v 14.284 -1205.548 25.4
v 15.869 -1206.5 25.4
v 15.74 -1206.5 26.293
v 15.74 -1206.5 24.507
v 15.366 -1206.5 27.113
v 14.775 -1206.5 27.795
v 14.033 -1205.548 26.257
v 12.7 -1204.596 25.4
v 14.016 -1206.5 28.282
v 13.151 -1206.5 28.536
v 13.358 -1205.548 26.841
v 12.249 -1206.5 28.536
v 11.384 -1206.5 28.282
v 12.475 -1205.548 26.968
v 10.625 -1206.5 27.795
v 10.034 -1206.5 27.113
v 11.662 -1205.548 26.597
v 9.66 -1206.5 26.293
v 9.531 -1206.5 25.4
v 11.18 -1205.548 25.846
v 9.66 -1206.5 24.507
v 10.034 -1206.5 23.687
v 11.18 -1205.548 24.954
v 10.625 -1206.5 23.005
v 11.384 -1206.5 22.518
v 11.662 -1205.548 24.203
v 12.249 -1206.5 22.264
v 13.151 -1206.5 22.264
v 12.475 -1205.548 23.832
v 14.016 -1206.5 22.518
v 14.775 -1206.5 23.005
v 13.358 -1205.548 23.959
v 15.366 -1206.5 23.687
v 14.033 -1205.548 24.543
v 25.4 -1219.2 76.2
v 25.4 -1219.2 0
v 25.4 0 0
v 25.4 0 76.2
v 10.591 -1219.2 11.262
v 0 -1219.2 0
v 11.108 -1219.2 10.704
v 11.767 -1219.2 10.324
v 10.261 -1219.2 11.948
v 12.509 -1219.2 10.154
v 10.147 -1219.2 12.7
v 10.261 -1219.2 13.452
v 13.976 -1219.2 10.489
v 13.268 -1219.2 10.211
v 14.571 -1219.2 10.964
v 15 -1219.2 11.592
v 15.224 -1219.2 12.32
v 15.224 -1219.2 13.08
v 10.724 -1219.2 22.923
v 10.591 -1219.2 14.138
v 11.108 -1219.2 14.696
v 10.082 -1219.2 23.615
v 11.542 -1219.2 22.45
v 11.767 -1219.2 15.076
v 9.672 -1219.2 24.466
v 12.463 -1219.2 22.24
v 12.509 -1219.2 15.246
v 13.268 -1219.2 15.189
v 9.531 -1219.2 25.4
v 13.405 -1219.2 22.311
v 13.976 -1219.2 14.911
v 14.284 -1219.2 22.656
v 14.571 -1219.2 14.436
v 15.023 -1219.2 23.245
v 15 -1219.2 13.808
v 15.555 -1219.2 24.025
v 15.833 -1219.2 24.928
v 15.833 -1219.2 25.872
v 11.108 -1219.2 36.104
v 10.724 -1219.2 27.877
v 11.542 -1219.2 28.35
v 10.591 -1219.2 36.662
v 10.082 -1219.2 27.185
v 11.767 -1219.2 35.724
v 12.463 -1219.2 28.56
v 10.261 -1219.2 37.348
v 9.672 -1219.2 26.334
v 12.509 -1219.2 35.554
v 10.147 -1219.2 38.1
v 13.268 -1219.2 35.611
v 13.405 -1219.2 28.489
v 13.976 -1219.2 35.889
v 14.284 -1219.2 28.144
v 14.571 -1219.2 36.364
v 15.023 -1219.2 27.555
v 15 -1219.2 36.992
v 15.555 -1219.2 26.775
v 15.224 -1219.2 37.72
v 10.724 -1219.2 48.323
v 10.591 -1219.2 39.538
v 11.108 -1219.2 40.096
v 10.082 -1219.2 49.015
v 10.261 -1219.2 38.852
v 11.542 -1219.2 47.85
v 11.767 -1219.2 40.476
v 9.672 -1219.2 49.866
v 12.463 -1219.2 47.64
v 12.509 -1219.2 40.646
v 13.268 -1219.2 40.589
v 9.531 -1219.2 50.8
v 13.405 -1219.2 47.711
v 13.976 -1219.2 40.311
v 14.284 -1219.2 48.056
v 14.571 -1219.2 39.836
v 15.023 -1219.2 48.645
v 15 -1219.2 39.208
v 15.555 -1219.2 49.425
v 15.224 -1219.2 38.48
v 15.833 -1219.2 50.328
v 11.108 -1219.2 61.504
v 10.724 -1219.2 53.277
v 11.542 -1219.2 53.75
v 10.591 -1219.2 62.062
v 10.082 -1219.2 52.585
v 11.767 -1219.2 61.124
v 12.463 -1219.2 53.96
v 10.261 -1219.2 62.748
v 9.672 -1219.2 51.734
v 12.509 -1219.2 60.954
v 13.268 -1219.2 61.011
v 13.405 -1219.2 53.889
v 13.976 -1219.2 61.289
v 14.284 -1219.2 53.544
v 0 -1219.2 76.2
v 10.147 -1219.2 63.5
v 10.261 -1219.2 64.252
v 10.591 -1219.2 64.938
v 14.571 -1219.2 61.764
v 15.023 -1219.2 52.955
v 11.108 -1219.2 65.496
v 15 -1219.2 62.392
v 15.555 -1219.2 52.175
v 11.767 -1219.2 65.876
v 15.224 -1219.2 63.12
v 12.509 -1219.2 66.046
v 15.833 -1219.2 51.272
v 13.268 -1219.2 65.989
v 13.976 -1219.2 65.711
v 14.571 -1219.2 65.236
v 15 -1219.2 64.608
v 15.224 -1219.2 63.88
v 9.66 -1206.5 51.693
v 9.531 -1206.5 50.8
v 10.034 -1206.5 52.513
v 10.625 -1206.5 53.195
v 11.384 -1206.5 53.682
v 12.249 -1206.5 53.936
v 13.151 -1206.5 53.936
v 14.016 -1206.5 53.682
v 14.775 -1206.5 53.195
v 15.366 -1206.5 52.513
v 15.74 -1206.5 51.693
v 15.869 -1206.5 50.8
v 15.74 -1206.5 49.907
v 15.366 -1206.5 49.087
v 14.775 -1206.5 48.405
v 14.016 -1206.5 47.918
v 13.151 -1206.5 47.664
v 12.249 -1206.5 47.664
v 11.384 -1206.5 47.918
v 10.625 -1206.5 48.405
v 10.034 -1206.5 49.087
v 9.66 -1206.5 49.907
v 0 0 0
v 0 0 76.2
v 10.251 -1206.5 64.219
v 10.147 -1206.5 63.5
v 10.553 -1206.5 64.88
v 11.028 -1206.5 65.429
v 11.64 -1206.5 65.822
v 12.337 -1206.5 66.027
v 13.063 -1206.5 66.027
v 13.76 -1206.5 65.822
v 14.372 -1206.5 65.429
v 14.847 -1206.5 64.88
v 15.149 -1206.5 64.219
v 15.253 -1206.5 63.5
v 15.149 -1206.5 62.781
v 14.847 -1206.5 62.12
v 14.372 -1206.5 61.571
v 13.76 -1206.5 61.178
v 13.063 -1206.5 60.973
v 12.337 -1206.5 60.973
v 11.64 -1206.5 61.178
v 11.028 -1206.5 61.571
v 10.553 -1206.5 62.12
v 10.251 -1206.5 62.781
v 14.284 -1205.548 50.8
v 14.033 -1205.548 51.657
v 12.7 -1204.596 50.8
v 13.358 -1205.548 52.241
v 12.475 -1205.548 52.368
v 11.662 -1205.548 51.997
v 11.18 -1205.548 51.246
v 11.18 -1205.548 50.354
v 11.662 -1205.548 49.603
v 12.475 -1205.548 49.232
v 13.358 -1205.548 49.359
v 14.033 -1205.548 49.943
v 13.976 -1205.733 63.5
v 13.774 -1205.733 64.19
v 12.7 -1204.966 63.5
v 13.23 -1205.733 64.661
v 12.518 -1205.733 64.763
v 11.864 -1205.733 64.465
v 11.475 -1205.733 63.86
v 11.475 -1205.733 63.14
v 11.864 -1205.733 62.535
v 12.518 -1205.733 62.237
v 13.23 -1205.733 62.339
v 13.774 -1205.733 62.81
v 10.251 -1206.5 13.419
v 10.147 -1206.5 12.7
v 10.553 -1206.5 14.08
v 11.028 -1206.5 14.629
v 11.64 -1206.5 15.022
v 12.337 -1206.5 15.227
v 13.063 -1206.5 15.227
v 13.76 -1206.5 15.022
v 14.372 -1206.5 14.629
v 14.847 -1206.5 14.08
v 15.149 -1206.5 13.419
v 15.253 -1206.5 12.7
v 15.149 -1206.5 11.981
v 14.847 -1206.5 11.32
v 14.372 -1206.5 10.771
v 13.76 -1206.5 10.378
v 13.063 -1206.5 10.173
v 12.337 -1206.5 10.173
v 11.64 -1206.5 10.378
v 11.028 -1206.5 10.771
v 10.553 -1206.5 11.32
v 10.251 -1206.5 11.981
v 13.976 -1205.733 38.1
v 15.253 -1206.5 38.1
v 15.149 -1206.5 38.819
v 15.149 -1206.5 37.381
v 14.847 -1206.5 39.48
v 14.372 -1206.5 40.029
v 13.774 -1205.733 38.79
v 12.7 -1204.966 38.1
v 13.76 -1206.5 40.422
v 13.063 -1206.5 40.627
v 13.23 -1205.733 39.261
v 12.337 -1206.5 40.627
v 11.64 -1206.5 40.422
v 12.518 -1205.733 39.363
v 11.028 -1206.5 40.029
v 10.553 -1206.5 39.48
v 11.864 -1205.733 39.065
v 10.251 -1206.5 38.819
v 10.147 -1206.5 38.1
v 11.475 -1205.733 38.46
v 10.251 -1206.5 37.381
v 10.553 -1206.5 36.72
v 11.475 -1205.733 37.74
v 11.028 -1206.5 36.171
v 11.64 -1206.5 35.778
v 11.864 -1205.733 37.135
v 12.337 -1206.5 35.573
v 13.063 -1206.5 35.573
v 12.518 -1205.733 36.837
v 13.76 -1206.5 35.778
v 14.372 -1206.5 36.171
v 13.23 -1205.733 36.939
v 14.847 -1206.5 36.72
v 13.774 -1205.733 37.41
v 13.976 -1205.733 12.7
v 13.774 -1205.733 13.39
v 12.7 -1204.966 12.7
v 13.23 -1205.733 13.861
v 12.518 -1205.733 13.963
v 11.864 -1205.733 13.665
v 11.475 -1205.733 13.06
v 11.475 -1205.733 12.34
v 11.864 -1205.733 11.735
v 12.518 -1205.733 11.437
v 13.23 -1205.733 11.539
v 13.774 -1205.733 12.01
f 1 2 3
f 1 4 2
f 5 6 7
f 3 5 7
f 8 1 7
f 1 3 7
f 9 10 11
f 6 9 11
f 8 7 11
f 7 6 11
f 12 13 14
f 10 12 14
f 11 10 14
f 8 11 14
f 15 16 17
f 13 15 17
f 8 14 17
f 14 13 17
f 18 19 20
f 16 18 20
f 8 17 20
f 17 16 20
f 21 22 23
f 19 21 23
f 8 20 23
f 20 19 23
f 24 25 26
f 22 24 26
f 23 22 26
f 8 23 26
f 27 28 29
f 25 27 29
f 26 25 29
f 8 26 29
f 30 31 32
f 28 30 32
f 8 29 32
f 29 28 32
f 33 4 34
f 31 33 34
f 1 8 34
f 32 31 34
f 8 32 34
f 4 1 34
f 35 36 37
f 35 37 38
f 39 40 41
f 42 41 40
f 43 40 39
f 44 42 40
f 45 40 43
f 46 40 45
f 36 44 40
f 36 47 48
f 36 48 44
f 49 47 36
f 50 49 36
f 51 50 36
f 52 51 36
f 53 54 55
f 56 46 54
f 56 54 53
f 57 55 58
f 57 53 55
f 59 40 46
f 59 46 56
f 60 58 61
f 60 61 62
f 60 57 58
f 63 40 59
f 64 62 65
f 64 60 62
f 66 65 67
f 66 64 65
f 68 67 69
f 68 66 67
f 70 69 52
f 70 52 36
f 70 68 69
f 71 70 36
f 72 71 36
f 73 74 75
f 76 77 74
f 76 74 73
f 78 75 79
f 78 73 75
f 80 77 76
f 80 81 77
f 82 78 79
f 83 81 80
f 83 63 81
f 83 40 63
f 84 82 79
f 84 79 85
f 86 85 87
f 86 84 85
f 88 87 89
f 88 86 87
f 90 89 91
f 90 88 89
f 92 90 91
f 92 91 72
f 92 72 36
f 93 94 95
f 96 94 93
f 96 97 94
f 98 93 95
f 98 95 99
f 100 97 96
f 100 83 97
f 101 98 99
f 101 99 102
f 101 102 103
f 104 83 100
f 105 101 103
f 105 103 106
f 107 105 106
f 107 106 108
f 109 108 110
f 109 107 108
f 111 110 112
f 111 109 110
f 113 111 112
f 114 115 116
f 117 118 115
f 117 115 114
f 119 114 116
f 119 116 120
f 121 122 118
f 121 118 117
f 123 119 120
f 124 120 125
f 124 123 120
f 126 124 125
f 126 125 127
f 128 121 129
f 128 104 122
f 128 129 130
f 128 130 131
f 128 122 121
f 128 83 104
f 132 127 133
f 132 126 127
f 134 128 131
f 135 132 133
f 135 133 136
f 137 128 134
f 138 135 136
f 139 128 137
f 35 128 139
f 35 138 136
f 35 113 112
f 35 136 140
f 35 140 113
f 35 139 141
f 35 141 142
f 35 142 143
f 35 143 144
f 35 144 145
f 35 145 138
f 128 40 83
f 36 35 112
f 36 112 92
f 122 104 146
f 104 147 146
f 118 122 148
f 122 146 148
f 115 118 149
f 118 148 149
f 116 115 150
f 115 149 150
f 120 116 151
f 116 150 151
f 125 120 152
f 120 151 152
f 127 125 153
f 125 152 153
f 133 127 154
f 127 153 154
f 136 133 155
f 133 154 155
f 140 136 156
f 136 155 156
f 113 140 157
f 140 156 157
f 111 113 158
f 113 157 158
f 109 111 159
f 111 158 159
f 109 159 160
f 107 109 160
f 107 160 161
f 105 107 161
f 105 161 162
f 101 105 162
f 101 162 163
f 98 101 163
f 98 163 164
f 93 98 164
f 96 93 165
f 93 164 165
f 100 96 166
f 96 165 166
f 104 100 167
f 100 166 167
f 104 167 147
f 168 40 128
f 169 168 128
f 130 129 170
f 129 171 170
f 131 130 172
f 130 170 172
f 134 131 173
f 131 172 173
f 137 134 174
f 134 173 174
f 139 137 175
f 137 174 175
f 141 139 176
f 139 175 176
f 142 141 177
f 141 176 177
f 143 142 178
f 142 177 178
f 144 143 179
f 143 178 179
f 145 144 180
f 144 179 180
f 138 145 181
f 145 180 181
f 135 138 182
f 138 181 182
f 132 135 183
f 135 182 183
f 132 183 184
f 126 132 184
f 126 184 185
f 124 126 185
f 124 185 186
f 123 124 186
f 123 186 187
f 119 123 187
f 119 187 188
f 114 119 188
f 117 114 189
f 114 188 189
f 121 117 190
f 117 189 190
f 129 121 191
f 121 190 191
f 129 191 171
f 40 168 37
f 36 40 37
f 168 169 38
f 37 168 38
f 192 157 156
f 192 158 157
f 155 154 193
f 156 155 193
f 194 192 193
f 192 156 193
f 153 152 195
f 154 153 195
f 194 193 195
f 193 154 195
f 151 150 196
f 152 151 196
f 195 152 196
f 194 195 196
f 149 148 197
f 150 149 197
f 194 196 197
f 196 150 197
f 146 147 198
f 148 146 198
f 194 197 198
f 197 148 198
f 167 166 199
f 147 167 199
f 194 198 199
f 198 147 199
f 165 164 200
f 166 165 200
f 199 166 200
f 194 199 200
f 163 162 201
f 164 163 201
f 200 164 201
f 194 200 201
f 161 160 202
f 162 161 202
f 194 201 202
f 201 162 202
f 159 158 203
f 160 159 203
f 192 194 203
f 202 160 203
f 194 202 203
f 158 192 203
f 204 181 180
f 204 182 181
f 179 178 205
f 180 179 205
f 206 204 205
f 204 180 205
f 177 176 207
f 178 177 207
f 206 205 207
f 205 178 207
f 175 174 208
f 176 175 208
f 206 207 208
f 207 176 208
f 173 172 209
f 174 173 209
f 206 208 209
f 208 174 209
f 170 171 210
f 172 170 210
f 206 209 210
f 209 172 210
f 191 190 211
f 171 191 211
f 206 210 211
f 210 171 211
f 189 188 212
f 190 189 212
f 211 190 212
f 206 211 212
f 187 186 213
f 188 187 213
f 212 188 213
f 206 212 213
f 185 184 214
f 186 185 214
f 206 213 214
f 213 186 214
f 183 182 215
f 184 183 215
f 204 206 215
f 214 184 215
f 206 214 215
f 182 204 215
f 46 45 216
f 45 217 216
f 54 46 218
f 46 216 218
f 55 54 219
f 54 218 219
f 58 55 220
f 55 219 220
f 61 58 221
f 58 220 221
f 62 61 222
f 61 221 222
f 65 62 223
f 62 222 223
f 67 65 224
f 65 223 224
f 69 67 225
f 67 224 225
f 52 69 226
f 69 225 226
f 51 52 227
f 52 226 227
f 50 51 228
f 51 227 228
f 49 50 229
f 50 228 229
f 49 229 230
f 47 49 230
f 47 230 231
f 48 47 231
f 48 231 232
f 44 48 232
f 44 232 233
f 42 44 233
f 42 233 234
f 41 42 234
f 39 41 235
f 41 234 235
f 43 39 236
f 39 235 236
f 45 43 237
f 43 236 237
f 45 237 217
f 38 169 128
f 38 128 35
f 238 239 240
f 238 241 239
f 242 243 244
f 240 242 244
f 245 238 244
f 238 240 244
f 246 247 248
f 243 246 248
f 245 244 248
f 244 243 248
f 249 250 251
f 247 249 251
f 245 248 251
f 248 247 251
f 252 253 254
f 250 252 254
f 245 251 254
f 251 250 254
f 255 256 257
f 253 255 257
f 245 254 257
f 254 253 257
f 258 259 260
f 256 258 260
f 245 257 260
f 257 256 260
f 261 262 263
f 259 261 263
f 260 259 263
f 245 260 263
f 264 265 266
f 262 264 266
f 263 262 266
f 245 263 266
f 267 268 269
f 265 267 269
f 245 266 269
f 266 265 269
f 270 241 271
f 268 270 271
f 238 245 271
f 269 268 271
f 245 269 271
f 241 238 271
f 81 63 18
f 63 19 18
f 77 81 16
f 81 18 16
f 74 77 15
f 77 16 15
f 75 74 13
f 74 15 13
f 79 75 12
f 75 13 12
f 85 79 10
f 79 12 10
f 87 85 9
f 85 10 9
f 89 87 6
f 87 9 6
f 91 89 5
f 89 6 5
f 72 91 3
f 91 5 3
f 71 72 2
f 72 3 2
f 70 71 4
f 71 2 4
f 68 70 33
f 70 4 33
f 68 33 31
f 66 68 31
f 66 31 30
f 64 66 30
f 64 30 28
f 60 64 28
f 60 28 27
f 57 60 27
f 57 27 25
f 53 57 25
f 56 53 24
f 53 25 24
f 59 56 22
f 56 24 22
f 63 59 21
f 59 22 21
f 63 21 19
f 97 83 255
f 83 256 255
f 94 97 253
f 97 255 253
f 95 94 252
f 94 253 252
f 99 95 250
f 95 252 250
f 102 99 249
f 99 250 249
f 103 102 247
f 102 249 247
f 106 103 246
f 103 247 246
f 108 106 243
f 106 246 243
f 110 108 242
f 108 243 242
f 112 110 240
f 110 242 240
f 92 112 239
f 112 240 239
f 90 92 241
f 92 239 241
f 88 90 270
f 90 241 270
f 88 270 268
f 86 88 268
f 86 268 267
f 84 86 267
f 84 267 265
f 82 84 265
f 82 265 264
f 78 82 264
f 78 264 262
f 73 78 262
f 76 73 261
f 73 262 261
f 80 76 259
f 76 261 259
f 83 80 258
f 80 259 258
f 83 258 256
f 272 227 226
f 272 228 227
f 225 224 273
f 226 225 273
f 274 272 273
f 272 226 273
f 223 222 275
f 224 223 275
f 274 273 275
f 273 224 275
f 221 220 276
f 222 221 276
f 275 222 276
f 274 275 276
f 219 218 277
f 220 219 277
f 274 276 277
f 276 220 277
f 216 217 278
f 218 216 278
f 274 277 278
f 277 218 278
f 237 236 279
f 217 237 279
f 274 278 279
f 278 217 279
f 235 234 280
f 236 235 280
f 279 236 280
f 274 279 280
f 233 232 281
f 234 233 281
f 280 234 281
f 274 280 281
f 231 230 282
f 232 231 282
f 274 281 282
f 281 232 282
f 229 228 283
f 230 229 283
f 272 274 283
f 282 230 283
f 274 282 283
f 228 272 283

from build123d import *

# Parameters (mm, degrees)
F0_W     = 25.4
F0_H     = 76.2
F1_DEPTH = 1219.2
F3_D     = 5.1054
F3_DEPTH = 12.7
F3_TIP   = 1.5338169022
F4_D     = 6.3373
F4_DEPTH = 12.7
F4_TIP   = 1.9039170005


with BuildPart() as f1:
    # F0 (on Front) → F1 (new body)
    with BuildSketch(Plane.XZ):
        with Locations((12.7, 38.1)):
            Rectangle(F0_W, F0_H)
    extrude(amount=F1_DEPTH)

    # F3
    with Locations(Plane.XZ.offset(1219.2)):
        with Locations((12.7, 63.5), (12.7, 38.1), (12.7, 12.7)):
            Hole(F3_D / 2, depth=F3_DEPTH)
            with Locations((0, 0, -(F3_DEPTH + F3_TIP / 2))):  # 118° drill point
                Cone(0, F3_D / 2, F3_TIP, mode=Mode.SUBTRACT)

    # F4
    with Locations(Plane.XZ.offset(1219.2)):
        with Locations((12.7, 50.8), (12.7, 25.4)):
            Hole(F4_D / 2, depth=F4_DEPTH)
            with Locations((0, 0, -(F4_DEPTH + F4_TIP / 2))):  # 118° drill point
                Cone(0, F4_D / 2, F4_TIP, mode=Mode.SUBTRACT)


solid = f1.part
